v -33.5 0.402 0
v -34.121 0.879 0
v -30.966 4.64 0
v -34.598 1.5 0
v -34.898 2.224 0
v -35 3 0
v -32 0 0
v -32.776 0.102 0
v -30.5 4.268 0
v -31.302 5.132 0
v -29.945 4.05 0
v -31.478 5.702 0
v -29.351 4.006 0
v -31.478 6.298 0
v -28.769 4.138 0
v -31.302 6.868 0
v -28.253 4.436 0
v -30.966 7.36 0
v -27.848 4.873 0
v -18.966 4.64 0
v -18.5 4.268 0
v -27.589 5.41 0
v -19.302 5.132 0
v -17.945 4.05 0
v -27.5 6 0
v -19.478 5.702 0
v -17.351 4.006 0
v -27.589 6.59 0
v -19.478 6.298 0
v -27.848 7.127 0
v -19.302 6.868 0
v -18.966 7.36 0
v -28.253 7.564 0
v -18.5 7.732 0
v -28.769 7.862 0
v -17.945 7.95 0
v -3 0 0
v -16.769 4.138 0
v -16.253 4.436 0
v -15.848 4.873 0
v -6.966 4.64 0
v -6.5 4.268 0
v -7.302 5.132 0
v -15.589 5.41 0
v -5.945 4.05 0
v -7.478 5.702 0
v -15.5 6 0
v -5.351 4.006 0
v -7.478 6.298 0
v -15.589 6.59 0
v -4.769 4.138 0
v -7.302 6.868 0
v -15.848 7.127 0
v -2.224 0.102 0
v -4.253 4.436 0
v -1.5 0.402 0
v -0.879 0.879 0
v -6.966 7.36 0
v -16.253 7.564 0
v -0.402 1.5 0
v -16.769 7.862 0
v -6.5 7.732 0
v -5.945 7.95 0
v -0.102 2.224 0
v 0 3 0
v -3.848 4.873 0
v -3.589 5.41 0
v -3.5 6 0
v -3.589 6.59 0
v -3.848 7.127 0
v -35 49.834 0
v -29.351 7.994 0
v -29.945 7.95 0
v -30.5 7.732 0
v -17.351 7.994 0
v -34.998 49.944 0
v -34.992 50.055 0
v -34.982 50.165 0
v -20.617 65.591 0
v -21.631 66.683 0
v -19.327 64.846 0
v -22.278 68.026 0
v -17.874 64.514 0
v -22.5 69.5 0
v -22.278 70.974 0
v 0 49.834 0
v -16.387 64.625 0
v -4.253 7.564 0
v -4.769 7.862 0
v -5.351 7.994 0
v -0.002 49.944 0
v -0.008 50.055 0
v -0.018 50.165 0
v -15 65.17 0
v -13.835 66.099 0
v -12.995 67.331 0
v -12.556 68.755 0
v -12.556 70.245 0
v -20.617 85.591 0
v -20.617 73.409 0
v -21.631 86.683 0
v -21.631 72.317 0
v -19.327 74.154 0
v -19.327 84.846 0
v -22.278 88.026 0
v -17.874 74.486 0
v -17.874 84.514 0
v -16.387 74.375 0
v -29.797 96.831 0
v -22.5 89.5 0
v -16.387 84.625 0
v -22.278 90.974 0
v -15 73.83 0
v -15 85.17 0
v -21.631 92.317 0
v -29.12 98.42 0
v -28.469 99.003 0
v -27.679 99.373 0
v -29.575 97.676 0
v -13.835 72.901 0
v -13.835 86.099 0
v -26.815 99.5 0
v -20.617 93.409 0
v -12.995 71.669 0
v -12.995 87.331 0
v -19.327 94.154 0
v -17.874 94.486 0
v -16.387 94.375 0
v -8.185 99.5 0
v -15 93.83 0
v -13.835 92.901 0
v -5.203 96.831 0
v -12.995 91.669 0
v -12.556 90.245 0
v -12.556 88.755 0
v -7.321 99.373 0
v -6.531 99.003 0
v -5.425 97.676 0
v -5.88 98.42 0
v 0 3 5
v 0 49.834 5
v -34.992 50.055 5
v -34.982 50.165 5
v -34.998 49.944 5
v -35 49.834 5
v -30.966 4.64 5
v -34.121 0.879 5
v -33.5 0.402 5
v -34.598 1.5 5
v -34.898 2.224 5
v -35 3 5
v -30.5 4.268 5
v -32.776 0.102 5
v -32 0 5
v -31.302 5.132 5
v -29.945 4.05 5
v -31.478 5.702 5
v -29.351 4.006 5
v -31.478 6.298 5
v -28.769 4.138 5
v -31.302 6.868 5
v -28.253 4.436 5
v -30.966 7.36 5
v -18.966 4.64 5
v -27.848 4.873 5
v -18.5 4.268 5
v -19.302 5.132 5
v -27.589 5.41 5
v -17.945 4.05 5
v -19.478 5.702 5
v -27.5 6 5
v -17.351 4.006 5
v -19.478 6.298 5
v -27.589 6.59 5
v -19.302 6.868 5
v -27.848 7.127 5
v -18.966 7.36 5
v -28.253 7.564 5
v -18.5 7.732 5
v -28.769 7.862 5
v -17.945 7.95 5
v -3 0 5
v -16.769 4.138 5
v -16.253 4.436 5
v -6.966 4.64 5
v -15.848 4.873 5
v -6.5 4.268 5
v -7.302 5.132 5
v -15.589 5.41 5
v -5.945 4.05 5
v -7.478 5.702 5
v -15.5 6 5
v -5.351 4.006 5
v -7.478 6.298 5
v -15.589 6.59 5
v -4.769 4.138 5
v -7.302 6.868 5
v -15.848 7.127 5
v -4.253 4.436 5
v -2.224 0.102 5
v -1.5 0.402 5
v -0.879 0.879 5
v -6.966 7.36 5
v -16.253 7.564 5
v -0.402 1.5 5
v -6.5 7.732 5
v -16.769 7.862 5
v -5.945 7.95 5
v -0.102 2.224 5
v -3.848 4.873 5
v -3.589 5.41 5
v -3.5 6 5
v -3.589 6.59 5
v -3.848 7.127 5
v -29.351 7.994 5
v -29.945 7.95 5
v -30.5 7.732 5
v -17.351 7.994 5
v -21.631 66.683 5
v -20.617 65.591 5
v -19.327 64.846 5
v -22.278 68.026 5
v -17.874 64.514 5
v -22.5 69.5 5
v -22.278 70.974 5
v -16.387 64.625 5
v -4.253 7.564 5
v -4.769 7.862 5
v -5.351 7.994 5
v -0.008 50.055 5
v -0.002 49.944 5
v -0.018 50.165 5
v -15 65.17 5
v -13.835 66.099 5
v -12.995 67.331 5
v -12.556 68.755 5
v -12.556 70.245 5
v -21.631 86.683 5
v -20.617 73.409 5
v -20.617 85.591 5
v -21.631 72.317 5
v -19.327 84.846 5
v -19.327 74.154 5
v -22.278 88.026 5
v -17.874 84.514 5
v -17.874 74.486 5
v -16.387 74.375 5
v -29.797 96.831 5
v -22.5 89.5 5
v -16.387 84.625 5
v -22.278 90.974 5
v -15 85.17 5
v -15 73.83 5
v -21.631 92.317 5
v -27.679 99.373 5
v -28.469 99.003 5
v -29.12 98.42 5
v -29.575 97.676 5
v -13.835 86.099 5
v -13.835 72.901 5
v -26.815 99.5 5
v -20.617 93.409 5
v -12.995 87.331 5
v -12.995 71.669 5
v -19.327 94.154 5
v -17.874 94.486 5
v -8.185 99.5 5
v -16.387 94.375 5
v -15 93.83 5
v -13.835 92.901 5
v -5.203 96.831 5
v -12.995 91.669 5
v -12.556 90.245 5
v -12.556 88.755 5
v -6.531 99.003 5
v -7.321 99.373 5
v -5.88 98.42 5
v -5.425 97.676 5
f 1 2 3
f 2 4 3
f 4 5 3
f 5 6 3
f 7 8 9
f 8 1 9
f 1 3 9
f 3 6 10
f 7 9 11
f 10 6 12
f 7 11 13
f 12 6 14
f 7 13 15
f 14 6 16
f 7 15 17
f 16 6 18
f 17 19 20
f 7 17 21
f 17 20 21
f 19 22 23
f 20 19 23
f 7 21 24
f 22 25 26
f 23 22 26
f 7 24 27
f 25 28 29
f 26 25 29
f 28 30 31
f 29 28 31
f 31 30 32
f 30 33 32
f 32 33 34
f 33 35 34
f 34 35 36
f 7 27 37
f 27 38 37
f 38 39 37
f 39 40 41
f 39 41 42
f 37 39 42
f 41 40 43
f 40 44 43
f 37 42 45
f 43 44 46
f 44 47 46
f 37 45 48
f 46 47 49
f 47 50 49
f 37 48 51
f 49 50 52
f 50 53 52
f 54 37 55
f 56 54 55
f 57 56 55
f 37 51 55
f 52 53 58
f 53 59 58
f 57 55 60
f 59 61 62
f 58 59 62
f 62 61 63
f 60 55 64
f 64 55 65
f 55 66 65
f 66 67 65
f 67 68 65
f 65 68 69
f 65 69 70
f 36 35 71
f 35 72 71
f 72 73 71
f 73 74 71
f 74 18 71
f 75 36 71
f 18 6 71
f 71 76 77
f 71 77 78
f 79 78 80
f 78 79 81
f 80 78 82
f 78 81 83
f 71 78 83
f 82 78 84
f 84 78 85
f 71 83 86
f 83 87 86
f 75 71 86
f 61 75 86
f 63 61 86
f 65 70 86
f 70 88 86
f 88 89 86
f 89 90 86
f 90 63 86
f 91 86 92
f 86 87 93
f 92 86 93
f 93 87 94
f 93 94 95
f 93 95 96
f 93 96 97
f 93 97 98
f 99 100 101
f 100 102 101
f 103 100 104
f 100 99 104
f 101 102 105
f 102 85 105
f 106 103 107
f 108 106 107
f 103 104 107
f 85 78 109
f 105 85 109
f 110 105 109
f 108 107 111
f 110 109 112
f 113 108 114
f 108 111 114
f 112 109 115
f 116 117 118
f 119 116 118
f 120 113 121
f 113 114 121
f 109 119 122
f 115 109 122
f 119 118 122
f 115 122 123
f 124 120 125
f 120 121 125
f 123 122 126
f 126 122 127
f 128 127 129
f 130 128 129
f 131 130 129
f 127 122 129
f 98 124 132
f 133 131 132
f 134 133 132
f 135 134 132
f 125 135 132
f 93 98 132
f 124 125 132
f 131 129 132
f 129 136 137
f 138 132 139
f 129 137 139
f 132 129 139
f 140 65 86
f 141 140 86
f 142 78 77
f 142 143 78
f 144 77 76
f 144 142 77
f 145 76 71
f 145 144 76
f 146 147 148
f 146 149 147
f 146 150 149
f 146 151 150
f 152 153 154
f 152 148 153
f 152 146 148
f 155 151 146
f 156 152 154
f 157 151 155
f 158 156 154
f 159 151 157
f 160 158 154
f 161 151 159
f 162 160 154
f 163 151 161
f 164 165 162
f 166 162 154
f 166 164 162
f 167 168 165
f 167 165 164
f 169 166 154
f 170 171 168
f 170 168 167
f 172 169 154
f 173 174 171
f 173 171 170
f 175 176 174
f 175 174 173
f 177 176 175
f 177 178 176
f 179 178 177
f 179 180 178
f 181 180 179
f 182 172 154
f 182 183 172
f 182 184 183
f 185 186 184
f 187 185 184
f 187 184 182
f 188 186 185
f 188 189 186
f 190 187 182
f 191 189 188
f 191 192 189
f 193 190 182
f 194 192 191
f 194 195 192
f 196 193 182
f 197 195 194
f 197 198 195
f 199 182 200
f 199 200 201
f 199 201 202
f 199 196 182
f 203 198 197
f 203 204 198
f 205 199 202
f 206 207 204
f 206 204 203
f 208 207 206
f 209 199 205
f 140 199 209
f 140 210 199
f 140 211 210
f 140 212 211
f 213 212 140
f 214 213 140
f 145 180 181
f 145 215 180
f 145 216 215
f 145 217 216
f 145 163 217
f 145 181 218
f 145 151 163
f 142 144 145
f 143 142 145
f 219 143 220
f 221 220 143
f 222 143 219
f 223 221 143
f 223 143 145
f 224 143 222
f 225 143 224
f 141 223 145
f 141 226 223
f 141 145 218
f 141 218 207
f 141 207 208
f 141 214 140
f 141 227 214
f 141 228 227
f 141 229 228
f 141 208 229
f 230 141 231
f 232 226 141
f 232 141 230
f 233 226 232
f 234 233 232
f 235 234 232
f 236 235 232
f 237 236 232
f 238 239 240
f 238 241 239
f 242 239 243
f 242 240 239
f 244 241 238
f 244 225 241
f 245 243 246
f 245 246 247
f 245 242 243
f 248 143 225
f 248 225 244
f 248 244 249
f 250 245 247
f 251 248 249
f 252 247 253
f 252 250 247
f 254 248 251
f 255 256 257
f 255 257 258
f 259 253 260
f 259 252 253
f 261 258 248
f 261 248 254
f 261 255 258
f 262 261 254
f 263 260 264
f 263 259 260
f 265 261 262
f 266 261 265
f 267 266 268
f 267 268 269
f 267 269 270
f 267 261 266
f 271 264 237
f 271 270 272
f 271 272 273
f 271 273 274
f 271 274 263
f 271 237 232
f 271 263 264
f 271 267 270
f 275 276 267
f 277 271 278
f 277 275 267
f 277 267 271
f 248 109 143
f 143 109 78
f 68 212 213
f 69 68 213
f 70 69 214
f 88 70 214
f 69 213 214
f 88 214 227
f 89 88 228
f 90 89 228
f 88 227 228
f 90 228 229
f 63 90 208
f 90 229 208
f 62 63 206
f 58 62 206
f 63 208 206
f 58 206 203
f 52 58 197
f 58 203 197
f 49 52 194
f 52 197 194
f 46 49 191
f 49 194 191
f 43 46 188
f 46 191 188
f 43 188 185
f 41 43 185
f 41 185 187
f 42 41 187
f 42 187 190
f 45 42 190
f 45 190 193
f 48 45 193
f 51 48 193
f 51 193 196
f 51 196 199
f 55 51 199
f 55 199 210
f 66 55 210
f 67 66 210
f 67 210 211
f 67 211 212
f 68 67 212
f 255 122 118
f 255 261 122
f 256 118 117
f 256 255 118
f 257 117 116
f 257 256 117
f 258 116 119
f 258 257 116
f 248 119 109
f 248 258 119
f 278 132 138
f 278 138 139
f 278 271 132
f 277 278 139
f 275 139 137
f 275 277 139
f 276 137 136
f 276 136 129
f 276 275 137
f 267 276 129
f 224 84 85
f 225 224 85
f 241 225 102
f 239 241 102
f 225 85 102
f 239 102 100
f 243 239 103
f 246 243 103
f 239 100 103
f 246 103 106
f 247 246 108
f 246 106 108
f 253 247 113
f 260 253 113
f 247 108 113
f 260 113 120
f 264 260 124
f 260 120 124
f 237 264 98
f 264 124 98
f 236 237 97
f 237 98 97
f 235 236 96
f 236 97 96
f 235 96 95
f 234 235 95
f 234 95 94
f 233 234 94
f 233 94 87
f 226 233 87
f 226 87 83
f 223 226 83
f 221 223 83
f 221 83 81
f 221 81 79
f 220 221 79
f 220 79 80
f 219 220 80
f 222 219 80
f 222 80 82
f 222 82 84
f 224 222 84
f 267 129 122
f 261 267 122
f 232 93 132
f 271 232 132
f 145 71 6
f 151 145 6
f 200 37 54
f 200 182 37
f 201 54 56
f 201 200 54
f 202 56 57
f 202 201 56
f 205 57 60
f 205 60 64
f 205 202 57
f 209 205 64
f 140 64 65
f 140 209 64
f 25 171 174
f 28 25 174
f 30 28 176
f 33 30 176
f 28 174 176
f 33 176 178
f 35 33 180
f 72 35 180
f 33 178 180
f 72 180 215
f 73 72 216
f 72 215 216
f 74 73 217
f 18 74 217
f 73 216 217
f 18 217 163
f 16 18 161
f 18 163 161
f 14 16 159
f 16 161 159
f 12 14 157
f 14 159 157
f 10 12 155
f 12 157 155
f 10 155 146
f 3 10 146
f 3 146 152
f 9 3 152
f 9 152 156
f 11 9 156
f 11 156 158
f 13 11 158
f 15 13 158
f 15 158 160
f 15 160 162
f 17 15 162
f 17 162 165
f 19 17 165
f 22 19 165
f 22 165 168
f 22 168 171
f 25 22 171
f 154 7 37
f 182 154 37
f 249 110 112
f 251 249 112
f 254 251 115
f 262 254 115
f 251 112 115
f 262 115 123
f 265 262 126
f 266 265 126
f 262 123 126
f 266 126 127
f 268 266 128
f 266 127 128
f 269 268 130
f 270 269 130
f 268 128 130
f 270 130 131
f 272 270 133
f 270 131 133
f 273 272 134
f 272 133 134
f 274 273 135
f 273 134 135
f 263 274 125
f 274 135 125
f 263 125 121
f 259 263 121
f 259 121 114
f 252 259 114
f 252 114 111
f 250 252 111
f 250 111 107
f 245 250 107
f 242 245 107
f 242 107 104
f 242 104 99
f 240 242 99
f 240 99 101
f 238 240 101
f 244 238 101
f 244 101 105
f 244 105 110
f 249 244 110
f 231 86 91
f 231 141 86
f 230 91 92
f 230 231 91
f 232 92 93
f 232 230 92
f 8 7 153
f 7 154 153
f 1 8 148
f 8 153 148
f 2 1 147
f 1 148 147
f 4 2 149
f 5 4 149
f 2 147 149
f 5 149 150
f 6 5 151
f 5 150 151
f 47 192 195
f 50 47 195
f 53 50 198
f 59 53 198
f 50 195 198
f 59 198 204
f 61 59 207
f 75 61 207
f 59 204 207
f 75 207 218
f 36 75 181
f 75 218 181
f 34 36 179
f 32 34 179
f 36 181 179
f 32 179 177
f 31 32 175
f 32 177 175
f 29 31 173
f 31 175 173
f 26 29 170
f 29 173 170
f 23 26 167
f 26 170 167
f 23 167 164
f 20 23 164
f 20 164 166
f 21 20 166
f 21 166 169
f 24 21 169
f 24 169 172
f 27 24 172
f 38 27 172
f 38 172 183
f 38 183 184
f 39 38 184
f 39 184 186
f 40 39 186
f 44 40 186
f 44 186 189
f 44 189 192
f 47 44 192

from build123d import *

# Parameters (mm, degrees)
EXTRUDE_1_DEPTH         = 5
FILLET_1_R              = 3
SKETCH_2_R              = 2
SKETCH_2_R_2            = 4.5
CUT_EXTRUDE_1_DEPTH     = 106.594744187
HOLE_WIZARD_M10_5_D     = 10
HOLE_WIZARD_M10_5_DEPTH = 24.5


with BuildPart() as part:
    # 草图1 → 凸台-拉伸1 (new body)
    with BuildSketch(Plane.XY):
        Polygon((-35, 0), (0, 0), (0, 50), (-5.5, 99.5), (-29.5, 99.5), (-35, 50), align=None)
    extrude(amount=EXTRUDE_1_DEPTH)

    # 圆角1
    fillet_1_edges = [part.edges().sort_by_distance(p)[0] for p in [
        (-35, 50, 2.5),
        (-29.5, 99.5, 2.5),
        (-5.5, 99.5, 2.5),
        (0, 50, 2.5),
        (0, 0, 2.5),
        (-35, 0, 2.5),
    ]]
    fillet(fillet_1_edges, radius=FILLET_1_R)

    # 草图2 → 切除-拉伸1 (cut, through all)
    with BuildSketch(Plane.XY.offset(5)):
        with Locations((-29.5, 6)):
            Circle(SKETCH_2_R)
        with Locations((-17.5, 6)):
            Circle(SKETCH_2_R)
        with Locations((-5.5, 6)):
            Circle(SKETCH_2_R)
        with Locations((-17.5, 89.5)):
            Circle(SKETCH_2_R_2)
        with Locations((-17.5, 69.5)):
            Circle(SKETCH_2_R_2)
    extrude(amount=-CUT_EXTRUDE_1_DEPTH, mode=Mode.SUBTRACT)

    # M10 螺纹孔5
    with Locations(Plane.XY.offset(5)):
        with Locations((-17.5, 69.5), (-17.5, 89.5)):
            Hole(HOLE_WIZARD_M10_5_D / 2, depth=HOLE_WIZARD_M10_5_DEPTH)


solid = part.part
